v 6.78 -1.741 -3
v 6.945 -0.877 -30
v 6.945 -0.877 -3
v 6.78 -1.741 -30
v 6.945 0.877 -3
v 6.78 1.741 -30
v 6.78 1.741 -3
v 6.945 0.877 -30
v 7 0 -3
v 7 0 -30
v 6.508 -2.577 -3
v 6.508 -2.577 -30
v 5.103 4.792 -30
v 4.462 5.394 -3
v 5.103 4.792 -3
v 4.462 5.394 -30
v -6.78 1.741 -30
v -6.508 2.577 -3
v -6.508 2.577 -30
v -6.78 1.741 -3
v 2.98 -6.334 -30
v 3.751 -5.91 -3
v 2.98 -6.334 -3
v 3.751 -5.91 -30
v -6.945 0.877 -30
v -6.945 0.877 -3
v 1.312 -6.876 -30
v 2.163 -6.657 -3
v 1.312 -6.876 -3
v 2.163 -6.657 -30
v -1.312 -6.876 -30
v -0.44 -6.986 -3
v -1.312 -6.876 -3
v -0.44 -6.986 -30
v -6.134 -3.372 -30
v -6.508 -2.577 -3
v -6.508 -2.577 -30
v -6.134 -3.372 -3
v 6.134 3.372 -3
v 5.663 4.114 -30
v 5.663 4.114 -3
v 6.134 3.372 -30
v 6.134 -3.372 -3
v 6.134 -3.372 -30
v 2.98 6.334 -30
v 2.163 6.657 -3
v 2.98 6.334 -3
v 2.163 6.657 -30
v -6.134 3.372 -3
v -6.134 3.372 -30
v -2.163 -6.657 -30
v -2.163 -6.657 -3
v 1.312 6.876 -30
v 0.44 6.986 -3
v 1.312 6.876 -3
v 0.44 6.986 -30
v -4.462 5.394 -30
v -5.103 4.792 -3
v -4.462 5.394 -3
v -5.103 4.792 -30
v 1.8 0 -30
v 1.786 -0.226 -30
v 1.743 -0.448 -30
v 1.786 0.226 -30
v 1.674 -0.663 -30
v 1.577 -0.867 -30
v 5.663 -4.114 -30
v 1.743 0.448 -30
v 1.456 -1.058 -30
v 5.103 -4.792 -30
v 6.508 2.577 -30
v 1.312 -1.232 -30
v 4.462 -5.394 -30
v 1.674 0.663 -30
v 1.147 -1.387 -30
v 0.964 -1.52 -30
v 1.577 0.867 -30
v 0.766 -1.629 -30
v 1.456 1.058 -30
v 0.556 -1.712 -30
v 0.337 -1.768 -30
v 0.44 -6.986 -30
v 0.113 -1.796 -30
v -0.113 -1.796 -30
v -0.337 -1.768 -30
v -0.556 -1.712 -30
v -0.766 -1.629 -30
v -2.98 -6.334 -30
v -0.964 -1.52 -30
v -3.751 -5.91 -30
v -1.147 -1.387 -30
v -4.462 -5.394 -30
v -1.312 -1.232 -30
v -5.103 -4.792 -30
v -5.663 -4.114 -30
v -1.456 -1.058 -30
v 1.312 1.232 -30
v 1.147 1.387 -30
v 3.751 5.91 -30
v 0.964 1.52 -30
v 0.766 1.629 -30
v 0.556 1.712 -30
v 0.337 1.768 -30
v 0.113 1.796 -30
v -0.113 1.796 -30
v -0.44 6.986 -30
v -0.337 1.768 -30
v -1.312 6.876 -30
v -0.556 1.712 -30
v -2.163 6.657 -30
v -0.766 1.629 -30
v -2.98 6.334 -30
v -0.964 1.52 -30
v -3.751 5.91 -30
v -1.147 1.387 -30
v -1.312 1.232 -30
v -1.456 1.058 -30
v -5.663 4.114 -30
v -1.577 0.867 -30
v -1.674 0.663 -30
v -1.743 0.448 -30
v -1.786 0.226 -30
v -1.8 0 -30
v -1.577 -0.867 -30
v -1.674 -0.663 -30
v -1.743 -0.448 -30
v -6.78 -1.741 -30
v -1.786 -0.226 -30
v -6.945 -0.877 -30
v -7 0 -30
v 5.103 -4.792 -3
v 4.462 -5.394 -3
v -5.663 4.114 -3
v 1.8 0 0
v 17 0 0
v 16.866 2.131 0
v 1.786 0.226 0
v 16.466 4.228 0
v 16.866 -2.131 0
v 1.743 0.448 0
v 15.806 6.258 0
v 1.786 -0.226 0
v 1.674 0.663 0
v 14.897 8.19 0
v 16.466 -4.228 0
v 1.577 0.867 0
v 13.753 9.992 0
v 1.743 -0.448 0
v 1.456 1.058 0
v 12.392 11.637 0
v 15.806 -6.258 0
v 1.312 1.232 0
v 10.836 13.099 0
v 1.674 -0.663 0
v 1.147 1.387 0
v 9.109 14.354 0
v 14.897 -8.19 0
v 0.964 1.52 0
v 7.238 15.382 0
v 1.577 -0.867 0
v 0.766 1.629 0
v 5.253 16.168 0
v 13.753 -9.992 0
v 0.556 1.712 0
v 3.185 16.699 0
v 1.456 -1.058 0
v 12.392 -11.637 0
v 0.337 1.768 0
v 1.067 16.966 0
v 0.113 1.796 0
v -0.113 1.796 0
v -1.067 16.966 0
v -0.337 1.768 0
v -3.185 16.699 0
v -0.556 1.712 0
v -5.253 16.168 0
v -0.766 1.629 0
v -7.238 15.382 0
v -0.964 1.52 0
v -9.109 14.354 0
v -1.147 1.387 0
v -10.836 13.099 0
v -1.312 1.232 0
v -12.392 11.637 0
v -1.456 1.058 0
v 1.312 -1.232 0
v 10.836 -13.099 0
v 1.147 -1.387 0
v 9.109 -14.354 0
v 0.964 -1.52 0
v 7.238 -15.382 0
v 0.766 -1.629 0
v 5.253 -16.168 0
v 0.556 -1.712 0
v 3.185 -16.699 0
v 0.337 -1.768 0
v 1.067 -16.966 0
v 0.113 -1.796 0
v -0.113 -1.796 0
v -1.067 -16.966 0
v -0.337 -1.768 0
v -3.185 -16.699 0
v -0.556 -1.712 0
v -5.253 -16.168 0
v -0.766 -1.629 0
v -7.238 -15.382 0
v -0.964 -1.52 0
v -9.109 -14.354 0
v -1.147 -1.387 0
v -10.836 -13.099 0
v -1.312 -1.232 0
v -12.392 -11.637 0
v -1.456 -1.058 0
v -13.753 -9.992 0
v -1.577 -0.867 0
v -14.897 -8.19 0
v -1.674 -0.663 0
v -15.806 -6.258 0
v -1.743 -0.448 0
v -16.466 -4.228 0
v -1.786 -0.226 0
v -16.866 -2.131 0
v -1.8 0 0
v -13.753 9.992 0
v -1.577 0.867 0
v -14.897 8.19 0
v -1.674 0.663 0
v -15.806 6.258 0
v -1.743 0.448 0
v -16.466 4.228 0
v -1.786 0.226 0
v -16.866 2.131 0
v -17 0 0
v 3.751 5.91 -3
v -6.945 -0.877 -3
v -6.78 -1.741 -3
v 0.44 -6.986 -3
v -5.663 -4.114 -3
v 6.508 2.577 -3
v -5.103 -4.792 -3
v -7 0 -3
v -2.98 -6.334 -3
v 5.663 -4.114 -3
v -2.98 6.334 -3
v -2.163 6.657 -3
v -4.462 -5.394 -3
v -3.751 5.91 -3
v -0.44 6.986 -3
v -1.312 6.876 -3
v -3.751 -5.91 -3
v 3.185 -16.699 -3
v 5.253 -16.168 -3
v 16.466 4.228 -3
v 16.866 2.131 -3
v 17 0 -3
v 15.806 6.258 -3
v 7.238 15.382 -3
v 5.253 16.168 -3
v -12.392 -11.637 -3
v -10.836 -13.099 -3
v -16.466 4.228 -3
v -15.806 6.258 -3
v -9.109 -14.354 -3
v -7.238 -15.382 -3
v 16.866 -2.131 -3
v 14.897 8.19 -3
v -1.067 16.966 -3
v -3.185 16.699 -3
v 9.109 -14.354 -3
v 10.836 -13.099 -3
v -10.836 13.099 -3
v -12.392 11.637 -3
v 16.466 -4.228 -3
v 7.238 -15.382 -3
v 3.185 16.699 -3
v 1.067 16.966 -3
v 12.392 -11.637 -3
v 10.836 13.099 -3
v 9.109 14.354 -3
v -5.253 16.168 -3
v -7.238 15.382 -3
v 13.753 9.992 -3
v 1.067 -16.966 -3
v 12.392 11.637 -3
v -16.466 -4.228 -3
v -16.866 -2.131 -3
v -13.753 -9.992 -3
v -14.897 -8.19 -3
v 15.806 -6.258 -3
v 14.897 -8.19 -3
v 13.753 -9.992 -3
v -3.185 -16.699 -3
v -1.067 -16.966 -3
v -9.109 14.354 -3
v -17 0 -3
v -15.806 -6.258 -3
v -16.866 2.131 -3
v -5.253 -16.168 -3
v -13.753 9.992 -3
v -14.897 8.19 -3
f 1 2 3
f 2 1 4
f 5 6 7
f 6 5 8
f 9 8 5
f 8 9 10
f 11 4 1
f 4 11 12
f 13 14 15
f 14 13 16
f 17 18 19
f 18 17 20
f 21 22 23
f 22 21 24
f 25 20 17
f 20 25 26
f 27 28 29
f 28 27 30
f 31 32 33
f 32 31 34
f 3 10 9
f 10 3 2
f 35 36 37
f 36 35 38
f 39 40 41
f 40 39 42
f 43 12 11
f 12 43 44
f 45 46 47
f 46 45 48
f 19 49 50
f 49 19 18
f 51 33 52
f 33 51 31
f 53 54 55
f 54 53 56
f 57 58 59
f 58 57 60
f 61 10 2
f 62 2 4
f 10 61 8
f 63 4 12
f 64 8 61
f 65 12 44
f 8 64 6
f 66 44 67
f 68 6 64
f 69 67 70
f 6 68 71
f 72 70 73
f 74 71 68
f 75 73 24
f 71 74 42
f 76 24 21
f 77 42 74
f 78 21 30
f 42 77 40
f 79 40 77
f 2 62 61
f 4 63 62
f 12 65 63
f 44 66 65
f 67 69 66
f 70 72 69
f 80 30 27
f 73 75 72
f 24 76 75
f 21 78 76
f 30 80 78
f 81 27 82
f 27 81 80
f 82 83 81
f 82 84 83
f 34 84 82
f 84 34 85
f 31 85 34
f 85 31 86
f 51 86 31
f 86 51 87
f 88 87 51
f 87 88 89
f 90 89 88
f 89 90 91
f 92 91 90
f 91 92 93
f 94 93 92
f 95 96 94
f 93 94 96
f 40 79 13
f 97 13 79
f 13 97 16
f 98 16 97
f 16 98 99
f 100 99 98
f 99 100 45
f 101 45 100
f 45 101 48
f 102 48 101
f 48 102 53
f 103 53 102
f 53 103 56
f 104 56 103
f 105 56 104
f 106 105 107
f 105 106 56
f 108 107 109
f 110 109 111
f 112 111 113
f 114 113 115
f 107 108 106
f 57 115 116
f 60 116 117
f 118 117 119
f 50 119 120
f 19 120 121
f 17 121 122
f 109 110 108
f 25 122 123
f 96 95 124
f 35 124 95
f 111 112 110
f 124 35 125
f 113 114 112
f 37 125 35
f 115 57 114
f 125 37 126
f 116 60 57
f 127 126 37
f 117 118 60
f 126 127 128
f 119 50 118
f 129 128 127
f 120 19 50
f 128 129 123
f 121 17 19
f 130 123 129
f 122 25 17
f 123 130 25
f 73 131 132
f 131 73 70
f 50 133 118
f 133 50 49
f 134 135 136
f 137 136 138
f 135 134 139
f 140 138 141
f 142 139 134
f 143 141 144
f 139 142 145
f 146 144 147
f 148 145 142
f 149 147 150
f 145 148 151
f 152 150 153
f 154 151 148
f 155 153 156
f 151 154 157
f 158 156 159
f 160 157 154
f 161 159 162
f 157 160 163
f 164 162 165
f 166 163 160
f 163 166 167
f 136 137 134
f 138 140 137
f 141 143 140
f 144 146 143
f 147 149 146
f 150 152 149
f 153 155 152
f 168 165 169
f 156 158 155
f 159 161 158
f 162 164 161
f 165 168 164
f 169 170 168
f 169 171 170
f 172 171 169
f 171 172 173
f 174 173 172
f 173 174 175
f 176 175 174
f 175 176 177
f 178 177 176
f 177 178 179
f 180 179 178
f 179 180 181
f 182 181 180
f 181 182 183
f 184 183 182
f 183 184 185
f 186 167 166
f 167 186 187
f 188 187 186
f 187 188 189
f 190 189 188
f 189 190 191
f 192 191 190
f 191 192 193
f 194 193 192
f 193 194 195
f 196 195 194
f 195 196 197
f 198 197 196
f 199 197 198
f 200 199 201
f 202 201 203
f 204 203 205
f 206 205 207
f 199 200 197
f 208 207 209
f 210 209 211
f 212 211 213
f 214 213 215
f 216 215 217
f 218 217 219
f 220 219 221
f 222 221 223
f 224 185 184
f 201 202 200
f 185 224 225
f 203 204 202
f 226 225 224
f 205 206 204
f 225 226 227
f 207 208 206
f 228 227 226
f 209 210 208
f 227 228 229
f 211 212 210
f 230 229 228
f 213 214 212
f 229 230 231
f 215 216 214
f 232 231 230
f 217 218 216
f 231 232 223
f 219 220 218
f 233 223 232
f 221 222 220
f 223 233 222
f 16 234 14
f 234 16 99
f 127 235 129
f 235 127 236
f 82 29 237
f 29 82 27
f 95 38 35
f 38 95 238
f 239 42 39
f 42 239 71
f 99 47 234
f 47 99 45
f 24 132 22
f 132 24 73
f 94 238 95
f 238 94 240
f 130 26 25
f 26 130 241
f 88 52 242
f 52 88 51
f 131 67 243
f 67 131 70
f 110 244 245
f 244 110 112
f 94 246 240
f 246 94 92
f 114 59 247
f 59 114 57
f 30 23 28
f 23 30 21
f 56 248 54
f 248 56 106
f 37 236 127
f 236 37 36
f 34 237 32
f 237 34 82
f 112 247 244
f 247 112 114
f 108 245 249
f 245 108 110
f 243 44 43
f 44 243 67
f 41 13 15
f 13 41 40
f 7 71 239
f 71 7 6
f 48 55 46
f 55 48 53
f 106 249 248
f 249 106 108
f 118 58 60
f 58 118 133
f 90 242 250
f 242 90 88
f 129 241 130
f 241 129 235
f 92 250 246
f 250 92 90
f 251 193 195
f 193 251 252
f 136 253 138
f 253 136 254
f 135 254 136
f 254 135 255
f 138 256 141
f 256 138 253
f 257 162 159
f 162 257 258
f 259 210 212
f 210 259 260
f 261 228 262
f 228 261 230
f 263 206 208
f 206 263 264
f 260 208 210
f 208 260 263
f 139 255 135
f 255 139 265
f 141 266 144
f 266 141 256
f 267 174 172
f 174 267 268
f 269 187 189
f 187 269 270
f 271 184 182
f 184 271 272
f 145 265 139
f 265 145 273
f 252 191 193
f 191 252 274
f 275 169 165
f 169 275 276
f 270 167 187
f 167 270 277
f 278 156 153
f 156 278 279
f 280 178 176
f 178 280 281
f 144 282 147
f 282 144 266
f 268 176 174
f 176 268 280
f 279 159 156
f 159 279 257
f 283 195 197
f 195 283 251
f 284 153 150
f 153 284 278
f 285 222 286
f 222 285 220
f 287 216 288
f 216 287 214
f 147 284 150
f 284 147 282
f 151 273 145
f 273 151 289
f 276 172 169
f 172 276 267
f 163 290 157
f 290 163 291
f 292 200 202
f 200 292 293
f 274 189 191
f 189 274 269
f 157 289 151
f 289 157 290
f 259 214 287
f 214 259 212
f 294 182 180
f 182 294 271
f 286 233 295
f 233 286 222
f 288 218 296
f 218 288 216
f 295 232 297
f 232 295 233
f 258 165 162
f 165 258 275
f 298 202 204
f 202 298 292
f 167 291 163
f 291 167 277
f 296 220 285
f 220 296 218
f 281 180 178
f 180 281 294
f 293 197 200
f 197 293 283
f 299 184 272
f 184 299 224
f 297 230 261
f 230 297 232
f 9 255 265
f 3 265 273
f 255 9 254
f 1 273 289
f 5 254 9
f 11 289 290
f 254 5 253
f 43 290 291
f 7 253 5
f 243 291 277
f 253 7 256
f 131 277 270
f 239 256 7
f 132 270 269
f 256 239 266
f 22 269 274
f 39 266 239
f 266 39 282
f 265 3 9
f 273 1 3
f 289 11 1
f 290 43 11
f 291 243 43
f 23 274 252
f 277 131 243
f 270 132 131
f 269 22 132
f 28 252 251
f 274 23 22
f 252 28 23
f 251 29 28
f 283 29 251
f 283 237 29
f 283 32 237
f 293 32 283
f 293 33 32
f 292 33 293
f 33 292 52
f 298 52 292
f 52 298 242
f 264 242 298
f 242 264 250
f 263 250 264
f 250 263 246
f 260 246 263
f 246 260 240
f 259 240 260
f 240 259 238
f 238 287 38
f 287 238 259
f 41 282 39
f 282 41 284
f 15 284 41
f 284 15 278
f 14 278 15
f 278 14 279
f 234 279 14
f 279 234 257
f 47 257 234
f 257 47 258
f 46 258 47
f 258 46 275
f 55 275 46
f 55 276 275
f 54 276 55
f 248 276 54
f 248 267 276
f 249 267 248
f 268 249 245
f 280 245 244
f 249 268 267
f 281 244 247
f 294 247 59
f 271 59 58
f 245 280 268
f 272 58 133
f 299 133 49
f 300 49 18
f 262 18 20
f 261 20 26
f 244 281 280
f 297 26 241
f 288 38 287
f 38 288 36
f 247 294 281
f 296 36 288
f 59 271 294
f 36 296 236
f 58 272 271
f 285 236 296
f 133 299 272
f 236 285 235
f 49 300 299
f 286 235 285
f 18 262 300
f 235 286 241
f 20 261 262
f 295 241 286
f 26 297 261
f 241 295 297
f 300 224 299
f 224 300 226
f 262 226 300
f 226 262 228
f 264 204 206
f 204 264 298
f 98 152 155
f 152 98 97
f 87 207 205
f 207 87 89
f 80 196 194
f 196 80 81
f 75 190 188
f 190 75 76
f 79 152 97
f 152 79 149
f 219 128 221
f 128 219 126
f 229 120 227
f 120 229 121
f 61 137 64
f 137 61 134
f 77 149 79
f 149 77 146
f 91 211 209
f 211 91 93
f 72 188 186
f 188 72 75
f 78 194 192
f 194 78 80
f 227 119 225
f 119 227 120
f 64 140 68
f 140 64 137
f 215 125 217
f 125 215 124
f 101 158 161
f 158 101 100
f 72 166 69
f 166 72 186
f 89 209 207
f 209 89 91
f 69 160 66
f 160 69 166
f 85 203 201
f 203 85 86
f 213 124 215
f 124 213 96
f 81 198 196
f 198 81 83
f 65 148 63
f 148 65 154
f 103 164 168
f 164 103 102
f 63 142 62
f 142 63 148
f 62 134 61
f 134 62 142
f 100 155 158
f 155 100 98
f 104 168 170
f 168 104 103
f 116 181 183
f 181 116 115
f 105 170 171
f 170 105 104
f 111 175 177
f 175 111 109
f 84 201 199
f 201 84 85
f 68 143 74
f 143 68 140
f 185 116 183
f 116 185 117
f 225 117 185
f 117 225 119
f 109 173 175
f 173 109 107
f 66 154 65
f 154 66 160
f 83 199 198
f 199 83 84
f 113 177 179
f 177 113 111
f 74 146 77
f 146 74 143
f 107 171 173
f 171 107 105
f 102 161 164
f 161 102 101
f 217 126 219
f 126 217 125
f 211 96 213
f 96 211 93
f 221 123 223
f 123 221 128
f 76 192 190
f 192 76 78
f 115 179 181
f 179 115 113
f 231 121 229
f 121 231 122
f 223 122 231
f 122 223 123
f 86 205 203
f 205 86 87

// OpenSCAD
$fn = 50;


difference() {
	union() {
		translate(v = [0, 0, -30.0000000000]) {
			cylinder(h = 30, r = 7.0000000000);
		}
		translate(v = [0, 0, -3.0000000000]) {
			cylinder(h = 3, r = 17.0000000000);
		}
	}
	union() {
		#translate(v = [0, 0, -30]) {
			cylinder(h = 30, r = 1.8000000000);
		}
	}
}
